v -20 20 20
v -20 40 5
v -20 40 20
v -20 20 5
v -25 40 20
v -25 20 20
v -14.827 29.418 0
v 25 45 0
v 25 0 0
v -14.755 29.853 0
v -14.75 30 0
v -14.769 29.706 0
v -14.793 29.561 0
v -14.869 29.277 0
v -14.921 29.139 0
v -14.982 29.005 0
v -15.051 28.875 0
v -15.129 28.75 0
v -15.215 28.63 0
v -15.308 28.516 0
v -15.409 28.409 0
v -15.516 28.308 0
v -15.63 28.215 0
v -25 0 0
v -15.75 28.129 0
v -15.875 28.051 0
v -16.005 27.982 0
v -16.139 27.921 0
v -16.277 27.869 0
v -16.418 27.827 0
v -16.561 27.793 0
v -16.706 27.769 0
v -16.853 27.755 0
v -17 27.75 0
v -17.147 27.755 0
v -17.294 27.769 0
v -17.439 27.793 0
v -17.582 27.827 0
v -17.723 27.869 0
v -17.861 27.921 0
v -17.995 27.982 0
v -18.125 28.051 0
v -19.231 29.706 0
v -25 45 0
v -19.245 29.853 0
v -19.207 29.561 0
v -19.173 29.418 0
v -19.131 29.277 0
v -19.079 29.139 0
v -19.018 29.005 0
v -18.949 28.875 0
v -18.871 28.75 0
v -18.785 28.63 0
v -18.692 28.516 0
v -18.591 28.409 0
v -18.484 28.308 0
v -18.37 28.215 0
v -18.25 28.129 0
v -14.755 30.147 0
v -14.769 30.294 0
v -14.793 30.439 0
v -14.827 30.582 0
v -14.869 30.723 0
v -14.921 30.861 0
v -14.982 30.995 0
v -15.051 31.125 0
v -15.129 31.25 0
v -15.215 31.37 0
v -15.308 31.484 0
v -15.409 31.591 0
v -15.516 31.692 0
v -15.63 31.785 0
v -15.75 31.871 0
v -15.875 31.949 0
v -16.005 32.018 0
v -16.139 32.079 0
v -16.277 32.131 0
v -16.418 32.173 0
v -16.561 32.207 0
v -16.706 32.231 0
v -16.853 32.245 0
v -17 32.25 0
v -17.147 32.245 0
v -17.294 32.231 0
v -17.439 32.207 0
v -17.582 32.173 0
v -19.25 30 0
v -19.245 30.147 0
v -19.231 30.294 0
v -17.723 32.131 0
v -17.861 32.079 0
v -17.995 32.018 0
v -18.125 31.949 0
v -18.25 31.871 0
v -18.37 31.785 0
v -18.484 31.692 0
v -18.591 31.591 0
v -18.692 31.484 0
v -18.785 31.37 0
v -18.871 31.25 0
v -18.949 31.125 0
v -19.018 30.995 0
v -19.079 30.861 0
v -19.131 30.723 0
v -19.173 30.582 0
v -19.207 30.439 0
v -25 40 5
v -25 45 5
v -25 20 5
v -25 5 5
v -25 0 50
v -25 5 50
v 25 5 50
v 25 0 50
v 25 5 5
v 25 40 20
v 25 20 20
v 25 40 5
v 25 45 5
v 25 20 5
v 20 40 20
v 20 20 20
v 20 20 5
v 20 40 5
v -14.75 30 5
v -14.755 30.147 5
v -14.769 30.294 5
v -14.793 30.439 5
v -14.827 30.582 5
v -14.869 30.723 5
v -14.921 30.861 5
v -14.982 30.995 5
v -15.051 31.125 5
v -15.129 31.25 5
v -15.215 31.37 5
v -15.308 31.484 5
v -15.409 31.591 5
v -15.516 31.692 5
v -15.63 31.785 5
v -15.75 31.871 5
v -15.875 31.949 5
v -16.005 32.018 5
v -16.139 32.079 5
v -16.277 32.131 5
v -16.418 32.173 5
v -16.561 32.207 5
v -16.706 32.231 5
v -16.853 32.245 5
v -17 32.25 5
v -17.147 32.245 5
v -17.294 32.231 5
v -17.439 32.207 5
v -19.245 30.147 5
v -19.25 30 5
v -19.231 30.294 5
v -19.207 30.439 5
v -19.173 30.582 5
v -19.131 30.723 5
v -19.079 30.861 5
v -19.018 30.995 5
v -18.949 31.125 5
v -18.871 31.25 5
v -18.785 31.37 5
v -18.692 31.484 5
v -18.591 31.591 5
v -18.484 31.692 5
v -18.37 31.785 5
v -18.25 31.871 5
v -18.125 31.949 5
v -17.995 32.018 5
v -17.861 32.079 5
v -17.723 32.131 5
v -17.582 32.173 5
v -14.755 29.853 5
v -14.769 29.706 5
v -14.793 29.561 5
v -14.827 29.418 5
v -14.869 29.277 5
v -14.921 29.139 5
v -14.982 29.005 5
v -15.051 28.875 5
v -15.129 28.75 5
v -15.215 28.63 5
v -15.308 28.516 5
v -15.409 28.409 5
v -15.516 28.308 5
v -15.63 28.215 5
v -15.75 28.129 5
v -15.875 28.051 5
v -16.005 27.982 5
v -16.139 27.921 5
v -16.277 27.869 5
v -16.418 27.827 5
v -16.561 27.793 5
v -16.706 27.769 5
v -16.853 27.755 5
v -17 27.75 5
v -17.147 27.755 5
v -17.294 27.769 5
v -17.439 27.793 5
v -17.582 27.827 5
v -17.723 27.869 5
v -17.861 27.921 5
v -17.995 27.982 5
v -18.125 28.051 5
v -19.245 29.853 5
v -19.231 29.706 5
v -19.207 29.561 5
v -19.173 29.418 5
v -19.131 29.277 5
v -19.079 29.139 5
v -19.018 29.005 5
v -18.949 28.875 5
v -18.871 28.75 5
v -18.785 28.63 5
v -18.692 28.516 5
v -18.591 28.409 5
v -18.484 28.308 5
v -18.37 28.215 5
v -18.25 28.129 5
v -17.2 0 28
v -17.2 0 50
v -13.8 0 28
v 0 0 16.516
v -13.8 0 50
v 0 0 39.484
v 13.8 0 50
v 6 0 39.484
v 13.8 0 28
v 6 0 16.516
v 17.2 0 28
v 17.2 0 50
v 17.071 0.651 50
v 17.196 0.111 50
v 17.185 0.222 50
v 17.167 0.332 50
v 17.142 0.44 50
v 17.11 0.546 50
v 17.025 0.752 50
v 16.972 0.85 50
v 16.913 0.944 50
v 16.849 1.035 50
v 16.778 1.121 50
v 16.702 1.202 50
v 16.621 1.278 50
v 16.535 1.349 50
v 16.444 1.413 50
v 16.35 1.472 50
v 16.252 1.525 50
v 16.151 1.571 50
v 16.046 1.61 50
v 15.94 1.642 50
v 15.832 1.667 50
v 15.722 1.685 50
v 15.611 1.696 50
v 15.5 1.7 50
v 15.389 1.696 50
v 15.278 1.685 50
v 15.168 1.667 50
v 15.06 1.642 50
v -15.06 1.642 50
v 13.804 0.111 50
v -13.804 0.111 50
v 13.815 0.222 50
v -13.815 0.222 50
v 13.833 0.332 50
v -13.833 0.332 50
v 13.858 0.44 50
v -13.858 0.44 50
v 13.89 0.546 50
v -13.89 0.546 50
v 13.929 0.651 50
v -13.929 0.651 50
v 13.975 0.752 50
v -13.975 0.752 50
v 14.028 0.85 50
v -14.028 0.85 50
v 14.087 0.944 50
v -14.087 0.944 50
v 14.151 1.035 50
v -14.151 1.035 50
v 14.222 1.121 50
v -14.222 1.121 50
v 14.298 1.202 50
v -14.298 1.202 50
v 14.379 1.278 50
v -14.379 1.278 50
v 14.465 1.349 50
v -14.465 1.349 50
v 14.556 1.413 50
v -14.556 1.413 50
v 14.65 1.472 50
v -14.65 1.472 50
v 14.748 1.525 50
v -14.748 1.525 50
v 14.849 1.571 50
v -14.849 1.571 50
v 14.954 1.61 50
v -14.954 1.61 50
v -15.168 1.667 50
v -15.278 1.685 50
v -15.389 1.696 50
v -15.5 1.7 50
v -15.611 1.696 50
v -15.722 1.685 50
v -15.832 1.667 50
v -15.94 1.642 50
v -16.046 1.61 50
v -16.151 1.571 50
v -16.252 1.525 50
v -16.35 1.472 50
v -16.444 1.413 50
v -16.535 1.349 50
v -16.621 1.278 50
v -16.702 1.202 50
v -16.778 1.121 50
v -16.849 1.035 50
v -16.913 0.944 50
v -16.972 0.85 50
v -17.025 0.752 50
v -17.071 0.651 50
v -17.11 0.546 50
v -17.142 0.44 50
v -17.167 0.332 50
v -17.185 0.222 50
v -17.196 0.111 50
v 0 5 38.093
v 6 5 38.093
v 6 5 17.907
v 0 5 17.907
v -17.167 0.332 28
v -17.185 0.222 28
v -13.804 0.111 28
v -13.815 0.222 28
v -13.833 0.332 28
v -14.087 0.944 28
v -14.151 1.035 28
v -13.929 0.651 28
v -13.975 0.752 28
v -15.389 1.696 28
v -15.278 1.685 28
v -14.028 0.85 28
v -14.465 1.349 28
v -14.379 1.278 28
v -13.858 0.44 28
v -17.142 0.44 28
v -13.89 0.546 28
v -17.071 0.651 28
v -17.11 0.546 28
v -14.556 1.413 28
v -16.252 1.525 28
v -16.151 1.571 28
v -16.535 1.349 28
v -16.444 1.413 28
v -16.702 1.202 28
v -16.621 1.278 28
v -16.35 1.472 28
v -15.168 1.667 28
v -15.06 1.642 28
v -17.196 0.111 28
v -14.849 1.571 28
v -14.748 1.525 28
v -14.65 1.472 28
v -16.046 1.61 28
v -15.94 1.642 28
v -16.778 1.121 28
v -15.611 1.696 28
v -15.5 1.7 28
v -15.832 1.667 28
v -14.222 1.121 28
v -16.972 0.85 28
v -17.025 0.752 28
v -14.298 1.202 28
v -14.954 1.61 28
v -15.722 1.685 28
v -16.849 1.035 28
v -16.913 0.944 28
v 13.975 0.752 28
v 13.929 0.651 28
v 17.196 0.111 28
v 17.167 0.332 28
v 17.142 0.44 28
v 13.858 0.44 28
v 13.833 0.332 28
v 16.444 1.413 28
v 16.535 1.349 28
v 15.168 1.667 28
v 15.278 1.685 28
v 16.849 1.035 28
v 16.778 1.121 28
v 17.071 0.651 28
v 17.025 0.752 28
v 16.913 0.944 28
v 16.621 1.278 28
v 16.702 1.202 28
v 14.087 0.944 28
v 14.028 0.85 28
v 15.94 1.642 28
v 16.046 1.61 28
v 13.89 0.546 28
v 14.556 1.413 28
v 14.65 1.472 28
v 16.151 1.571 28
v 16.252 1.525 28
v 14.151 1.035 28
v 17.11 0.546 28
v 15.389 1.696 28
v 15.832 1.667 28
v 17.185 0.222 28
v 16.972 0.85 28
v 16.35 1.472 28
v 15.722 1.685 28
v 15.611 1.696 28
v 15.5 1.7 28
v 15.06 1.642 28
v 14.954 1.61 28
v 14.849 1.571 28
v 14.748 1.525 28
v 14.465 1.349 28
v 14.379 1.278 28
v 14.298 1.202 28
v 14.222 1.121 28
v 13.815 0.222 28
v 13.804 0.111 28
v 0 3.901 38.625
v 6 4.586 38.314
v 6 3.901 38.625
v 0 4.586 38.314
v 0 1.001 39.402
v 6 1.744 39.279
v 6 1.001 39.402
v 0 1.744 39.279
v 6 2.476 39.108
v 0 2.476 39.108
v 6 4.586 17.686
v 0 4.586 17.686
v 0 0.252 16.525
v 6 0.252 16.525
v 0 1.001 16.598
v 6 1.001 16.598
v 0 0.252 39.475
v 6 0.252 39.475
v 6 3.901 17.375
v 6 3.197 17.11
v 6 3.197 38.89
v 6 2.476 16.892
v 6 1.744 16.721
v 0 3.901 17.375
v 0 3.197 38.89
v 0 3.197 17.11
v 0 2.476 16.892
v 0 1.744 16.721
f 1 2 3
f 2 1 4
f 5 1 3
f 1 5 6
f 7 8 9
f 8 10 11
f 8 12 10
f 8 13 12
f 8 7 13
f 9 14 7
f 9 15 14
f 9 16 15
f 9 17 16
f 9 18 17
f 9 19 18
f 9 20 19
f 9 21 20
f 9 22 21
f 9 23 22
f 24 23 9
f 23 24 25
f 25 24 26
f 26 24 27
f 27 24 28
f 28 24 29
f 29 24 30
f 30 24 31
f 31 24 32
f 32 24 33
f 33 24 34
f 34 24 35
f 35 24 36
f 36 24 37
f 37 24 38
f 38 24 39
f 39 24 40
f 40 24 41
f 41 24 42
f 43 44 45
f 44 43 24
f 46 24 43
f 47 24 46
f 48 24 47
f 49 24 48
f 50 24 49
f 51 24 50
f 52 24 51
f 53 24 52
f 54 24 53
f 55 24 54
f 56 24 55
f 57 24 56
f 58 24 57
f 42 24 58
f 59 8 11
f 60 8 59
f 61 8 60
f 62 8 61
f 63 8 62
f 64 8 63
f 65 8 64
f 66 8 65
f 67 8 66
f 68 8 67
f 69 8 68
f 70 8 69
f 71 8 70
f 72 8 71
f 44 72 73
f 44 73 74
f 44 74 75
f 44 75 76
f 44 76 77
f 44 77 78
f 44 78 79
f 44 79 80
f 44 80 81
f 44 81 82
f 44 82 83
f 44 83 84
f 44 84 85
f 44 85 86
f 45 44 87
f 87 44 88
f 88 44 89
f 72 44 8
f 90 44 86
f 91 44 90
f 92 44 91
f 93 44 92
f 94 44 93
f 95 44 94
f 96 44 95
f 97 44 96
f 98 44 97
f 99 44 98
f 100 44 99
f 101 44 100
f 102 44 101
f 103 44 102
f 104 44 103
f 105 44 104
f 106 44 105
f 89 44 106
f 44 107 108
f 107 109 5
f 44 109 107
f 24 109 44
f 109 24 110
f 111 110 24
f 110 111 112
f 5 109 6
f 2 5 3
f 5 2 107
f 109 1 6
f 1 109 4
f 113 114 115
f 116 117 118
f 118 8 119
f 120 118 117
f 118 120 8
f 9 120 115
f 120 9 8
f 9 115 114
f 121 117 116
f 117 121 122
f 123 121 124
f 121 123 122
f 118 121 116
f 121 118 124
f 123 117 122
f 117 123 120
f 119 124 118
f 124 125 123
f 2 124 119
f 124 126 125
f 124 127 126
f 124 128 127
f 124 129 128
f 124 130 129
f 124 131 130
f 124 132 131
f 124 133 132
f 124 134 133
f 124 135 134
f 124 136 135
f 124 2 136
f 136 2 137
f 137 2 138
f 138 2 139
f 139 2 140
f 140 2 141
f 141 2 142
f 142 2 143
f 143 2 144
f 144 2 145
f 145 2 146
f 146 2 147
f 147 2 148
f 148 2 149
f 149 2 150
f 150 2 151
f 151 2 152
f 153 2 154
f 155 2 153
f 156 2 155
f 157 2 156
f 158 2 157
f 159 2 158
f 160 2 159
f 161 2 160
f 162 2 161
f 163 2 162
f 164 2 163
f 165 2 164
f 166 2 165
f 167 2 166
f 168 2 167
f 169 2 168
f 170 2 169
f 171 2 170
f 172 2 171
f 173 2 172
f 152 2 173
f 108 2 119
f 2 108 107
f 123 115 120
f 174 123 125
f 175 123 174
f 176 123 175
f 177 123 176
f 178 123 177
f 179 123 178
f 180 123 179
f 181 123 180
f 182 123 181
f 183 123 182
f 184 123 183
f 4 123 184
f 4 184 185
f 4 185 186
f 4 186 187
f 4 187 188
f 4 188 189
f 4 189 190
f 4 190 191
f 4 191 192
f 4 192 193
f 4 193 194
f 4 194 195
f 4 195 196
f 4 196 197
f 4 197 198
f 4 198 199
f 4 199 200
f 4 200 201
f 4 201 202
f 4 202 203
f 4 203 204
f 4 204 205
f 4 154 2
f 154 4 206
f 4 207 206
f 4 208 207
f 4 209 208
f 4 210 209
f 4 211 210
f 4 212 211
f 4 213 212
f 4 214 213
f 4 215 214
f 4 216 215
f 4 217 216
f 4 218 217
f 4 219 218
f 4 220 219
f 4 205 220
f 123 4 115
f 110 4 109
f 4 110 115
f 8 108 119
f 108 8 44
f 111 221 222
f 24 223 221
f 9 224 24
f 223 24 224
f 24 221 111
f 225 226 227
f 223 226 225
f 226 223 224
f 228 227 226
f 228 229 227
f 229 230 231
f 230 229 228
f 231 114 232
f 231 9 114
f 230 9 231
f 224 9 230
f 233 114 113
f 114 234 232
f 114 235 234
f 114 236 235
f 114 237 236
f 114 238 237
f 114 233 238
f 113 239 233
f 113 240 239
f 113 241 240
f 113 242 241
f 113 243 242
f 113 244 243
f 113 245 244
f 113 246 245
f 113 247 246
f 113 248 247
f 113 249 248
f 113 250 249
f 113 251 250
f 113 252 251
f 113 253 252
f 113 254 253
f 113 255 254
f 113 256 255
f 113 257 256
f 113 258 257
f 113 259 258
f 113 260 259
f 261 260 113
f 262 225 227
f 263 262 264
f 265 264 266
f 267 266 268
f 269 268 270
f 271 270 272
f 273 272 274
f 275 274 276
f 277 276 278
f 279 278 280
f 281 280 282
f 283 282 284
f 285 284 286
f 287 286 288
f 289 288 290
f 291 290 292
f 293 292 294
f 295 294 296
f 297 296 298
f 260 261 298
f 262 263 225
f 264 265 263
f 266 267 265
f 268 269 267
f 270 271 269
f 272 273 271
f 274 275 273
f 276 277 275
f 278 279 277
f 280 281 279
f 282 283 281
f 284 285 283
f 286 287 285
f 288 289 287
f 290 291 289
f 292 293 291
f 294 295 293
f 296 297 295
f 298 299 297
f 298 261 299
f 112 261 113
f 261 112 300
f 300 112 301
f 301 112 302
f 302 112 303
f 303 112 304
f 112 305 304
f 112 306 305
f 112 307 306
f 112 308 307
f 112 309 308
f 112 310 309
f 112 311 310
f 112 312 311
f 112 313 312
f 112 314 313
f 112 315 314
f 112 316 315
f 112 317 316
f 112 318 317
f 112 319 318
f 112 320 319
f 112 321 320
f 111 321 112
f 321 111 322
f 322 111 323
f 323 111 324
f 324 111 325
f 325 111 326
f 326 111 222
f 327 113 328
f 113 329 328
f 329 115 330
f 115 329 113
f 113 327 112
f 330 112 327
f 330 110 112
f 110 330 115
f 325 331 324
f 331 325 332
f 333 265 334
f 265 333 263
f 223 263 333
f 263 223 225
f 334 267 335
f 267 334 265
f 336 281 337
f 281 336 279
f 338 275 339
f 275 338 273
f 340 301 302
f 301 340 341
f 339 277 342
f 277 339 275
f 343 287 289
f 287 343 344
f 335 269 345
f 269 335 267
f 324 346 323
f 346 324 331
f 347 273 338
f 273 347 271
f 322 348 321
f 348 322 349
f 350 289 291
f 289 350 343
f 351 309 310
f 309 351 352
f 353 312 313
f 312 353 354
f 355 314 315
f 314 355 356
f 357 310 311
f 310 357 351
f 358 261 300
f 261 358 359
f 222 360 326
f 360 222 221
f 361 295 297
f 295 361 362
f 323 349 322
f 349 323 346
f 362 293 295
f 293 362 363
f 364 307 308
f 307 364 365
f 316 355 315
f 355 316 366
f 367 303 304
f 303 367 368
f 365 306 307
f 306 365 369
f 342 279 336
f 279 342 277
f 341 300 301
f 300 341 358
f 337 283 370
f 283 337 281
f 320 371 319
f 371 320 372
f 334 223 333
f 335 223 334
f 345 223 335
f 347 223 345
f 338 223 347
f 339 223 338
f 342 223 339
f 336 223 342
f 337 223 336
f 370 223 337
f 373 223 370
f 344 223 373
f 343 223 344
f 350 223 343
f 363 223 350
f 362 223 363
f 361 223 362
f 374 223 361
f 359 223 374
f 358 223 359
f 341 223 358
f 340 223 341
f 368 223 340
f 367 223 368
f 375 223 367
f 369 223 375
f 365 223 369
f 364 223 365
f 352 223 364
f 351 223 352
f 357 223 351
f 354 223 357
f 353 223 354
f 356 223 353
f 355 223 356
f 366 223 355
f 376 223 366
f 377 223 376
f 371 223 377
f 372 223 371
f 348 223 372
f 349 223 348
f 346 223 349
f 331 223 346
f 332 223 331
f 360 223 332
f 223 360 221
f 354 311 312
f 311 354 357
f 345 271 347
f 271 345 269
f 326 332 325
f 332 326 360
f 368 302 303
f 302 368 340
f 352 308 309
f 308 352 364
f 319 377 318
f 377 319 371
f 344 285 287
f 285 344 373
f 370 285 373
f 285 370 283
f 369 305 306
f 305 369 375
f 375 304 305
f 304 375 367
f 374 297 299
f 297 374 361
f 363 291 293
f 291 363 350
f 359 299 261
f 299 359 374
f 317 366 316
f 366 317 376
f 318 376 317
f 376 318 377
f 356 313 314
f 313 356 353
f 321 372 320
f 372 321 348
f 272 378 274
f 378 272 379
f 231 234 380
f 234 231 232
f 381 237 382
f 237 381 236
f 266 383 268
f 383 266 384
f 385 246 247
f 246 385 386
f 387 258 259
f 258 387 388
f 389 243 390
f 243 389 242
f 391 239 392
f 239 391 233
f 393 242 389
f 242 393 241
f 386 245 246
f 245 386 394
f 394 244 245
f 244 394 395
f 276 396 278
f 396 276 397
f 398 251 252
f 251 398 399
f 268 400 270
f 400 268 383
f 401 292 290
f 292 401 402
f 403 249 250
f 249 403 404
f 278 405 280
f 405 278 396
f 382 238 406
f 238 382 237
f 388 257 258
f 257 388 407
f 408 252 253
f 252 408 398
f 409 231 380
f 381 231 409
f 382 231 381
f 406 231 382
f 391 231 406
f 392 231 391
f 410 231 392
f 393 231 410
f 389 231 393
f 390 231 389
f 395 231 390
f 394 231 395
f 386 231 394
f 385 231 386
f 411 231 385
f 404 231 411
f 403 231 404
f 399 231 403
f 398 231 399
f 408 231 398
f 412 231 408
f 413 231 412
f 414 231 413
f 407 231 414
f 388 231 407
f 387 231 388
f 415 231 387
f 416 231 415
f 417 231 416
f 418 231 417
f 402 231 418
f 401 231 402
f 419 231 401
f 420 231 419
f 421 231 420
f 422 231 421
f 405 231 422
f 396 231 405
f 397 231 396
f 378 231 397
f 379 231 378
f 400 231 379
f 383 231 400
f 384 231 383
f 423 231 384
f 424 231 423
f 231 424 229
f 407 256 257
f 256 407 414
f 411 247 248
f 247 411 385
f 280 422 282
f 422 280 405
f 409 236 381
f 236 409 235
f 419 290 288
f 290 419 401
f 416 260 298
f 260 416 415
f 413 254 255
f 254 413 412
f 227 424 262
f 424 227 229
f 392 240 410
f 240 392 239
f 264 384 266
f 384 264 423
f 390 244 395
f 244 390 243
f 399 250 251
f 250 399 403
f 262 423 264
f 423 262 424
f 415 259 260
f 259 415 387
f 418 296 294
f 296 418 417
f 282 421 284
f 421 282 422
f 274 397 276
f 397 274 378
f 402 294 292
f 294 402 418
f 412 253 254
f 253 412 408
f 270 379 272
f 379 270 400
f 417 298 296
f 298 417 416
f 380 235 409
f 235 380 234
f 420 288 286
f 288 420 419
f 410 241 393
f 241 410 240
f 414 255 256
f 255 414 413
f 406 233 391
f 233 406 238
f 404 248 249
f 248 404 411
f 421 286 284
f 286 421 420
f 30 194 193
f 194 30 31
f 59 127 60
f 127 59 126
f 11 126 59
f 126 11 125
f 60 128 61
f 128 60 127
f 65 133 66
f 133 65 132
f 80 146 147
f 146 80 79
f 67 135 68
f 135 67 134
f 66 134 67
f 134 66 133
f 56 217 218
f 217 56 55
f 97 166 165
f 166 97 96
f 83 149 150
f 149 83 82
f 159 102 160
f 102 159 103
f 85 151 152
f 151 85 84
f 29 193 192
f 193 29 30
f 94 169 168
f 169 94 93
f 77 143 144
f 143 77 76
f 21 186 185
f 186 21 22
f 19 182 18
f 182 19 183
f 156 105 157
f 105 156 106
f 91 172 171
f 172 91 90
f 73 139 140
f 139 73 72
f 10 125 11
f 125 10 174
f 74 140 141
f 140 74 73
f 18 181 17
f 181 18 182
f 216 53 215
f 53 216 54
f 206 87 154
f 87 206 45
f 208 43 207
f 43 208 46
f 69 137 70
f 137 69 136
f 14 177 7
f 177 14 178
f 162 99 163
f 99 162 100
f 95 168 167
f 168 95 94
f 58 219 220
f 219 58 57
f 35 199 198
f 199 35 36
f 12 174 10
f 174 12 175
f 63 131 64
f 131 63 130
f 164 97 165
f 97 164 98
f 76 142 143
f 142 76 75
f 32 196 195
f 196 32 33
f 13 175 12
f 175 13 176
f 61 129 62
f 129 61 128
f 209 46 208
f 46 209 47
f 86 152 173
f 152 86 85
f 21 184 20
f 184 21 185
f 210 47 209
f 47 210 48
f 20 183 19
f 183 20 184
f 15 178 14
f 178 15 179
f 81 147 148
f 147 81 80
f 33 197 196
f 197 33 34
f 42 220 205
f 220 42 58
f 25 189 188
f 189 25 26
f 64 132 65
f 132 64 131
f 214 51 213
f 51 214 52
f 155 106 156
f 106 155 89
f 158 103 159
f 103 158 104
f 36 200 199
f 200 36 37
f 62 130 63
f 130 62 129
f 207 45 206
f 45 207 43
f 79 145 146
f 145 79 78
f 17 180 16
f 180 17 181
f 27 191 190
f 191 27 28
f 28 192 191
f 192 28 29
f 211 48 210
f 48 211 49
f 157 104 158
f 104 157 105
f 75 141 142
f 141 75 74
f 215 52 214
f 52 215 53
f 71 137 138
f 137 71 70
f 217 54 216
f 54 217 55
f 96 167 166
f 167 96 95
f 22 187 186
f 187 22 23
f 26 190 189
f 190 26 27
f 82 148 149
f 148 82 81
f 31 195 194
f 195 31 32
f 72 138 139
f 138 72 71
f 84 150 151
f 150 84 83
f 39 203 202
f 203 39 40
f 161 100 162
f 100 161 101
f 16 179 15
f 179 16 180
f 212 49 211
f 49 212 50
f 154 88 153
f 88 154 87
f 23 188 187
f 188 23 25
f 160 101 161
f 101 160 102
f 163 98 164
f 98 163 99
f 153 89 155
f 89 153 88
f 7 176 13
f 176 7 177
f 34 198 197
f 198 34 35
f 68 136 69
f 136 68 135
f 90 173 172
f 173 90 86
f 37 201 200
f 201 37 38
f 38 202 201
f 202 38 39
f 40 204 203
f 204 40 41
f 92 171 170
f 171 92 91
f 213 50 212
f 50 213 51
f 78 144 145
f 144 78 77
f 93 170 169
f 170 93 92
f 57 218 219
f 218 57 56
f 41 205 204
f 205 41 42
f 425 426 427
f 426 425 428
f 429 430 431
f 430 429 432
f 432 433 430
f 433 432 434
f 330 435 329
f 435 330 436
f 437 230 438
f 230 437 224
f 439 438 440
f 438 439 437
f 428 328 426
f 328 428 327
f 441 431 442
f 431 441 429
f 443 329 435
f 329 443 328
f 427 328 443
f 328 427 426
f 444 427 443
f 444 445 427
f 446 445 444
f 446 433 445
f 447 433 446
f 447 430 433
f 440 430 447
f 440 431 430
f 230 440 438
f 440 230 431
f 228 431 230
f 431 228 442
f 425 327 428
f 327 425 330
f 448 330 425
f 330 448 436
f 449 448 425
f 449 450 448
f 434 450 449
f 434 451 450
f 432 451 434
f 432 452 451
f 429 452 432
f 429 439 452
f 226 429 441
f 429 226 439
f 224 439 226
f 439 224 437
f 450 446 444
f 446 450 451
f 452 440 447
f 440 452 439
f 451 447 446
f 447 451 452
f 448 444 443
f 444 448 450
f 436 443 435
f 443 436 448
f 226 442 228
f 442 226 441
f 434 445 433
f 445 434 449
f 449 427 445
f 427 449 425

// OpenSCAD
// NEMA 17 stepper motor L-shaped mounting bracket
// Print orientation: base plate on the bed, vertical plate builds up in +Z

// ---------- Parameters ----------
base_x1      = -25;   // base plate left edge (X)
base_x2      = 25;    // base plate right edge (X)
base_y       = 45;    // base plate depth (Y)
base_z       = 5;     // base plate thickness (Z)

motor_x1     = -25;   // motor plate left edge (X)
motor_x2     = 25;    // motor plate right edge (X)
motor_y      = 5;     // motor plate depth (Y)
motor_z      = 50;    // motor plate height (Z)

boss_d       = 23;    // motor centring boss hole diameter
boss_x       = 0;     // boss hole centre X
boss_z       = 28;    // boss hole centre Z

screw_d      = 3.4;   // M3 screw hole diameter
screw_pitch  = 31;    // screw hole square pattern size
screw_n      = 4;     // number of screw holes

gusset_t     = 5;     // gusset thickness (X)
gusset_y     = 20;    // gusset leg along +Y
gusset_z     = 20;    // gusset leg along +Z

hole_d       = 4.5;   // M4 through-hole diameter
hole_x       = -17;   // through-hole centre X
hole_y       = 30;    // through-hole centre Y

eps          = 0.5;   // cutter overshoot past faces
$fn          = 96;    // curve resolution

// ---------- Model ----------
difference() {
    union() {
        // Base plate
        translate([base_x1, 0, 0])
            cube([base_x2 - base_x1, base_y, base_z]);

        // Vertical motor plate
        translate([motor_x1, 0, 0])
            cube([motor_x2 - motor_x1, motor_y, motor_z]);

        // Gussets, flush with left and right edges
        for (sx = [-1, 1])
            translate([sx > 0 ? 20 : -25, 0, 0])
                translate([0, gusset_y, 0])
                    cube([gusset_t, gusset_y, gusset_z]);
    }

    // Through-holes in base plate
    translate([hole_x, hole_y, -eps])
        cylinder(d = hole_d, h = base_z + 2 * eps);

    // Motor boss hole along Y
    translate([boss_x, -eps, boss_z])
        rotate([0, 90, 0])
            cylinder(d = boss_d, h = motor_y + 2 * eps);

    // M3 screw holes on square pattern, centred on boss hole
    for (i = [0 : screw_n - 1])
        rotate([0, 0, i * 90])
            translate([-screw_pitch / 2, 0, boss_z])
                cylinder(d = screw_d, h = motor_z + eps);
}
